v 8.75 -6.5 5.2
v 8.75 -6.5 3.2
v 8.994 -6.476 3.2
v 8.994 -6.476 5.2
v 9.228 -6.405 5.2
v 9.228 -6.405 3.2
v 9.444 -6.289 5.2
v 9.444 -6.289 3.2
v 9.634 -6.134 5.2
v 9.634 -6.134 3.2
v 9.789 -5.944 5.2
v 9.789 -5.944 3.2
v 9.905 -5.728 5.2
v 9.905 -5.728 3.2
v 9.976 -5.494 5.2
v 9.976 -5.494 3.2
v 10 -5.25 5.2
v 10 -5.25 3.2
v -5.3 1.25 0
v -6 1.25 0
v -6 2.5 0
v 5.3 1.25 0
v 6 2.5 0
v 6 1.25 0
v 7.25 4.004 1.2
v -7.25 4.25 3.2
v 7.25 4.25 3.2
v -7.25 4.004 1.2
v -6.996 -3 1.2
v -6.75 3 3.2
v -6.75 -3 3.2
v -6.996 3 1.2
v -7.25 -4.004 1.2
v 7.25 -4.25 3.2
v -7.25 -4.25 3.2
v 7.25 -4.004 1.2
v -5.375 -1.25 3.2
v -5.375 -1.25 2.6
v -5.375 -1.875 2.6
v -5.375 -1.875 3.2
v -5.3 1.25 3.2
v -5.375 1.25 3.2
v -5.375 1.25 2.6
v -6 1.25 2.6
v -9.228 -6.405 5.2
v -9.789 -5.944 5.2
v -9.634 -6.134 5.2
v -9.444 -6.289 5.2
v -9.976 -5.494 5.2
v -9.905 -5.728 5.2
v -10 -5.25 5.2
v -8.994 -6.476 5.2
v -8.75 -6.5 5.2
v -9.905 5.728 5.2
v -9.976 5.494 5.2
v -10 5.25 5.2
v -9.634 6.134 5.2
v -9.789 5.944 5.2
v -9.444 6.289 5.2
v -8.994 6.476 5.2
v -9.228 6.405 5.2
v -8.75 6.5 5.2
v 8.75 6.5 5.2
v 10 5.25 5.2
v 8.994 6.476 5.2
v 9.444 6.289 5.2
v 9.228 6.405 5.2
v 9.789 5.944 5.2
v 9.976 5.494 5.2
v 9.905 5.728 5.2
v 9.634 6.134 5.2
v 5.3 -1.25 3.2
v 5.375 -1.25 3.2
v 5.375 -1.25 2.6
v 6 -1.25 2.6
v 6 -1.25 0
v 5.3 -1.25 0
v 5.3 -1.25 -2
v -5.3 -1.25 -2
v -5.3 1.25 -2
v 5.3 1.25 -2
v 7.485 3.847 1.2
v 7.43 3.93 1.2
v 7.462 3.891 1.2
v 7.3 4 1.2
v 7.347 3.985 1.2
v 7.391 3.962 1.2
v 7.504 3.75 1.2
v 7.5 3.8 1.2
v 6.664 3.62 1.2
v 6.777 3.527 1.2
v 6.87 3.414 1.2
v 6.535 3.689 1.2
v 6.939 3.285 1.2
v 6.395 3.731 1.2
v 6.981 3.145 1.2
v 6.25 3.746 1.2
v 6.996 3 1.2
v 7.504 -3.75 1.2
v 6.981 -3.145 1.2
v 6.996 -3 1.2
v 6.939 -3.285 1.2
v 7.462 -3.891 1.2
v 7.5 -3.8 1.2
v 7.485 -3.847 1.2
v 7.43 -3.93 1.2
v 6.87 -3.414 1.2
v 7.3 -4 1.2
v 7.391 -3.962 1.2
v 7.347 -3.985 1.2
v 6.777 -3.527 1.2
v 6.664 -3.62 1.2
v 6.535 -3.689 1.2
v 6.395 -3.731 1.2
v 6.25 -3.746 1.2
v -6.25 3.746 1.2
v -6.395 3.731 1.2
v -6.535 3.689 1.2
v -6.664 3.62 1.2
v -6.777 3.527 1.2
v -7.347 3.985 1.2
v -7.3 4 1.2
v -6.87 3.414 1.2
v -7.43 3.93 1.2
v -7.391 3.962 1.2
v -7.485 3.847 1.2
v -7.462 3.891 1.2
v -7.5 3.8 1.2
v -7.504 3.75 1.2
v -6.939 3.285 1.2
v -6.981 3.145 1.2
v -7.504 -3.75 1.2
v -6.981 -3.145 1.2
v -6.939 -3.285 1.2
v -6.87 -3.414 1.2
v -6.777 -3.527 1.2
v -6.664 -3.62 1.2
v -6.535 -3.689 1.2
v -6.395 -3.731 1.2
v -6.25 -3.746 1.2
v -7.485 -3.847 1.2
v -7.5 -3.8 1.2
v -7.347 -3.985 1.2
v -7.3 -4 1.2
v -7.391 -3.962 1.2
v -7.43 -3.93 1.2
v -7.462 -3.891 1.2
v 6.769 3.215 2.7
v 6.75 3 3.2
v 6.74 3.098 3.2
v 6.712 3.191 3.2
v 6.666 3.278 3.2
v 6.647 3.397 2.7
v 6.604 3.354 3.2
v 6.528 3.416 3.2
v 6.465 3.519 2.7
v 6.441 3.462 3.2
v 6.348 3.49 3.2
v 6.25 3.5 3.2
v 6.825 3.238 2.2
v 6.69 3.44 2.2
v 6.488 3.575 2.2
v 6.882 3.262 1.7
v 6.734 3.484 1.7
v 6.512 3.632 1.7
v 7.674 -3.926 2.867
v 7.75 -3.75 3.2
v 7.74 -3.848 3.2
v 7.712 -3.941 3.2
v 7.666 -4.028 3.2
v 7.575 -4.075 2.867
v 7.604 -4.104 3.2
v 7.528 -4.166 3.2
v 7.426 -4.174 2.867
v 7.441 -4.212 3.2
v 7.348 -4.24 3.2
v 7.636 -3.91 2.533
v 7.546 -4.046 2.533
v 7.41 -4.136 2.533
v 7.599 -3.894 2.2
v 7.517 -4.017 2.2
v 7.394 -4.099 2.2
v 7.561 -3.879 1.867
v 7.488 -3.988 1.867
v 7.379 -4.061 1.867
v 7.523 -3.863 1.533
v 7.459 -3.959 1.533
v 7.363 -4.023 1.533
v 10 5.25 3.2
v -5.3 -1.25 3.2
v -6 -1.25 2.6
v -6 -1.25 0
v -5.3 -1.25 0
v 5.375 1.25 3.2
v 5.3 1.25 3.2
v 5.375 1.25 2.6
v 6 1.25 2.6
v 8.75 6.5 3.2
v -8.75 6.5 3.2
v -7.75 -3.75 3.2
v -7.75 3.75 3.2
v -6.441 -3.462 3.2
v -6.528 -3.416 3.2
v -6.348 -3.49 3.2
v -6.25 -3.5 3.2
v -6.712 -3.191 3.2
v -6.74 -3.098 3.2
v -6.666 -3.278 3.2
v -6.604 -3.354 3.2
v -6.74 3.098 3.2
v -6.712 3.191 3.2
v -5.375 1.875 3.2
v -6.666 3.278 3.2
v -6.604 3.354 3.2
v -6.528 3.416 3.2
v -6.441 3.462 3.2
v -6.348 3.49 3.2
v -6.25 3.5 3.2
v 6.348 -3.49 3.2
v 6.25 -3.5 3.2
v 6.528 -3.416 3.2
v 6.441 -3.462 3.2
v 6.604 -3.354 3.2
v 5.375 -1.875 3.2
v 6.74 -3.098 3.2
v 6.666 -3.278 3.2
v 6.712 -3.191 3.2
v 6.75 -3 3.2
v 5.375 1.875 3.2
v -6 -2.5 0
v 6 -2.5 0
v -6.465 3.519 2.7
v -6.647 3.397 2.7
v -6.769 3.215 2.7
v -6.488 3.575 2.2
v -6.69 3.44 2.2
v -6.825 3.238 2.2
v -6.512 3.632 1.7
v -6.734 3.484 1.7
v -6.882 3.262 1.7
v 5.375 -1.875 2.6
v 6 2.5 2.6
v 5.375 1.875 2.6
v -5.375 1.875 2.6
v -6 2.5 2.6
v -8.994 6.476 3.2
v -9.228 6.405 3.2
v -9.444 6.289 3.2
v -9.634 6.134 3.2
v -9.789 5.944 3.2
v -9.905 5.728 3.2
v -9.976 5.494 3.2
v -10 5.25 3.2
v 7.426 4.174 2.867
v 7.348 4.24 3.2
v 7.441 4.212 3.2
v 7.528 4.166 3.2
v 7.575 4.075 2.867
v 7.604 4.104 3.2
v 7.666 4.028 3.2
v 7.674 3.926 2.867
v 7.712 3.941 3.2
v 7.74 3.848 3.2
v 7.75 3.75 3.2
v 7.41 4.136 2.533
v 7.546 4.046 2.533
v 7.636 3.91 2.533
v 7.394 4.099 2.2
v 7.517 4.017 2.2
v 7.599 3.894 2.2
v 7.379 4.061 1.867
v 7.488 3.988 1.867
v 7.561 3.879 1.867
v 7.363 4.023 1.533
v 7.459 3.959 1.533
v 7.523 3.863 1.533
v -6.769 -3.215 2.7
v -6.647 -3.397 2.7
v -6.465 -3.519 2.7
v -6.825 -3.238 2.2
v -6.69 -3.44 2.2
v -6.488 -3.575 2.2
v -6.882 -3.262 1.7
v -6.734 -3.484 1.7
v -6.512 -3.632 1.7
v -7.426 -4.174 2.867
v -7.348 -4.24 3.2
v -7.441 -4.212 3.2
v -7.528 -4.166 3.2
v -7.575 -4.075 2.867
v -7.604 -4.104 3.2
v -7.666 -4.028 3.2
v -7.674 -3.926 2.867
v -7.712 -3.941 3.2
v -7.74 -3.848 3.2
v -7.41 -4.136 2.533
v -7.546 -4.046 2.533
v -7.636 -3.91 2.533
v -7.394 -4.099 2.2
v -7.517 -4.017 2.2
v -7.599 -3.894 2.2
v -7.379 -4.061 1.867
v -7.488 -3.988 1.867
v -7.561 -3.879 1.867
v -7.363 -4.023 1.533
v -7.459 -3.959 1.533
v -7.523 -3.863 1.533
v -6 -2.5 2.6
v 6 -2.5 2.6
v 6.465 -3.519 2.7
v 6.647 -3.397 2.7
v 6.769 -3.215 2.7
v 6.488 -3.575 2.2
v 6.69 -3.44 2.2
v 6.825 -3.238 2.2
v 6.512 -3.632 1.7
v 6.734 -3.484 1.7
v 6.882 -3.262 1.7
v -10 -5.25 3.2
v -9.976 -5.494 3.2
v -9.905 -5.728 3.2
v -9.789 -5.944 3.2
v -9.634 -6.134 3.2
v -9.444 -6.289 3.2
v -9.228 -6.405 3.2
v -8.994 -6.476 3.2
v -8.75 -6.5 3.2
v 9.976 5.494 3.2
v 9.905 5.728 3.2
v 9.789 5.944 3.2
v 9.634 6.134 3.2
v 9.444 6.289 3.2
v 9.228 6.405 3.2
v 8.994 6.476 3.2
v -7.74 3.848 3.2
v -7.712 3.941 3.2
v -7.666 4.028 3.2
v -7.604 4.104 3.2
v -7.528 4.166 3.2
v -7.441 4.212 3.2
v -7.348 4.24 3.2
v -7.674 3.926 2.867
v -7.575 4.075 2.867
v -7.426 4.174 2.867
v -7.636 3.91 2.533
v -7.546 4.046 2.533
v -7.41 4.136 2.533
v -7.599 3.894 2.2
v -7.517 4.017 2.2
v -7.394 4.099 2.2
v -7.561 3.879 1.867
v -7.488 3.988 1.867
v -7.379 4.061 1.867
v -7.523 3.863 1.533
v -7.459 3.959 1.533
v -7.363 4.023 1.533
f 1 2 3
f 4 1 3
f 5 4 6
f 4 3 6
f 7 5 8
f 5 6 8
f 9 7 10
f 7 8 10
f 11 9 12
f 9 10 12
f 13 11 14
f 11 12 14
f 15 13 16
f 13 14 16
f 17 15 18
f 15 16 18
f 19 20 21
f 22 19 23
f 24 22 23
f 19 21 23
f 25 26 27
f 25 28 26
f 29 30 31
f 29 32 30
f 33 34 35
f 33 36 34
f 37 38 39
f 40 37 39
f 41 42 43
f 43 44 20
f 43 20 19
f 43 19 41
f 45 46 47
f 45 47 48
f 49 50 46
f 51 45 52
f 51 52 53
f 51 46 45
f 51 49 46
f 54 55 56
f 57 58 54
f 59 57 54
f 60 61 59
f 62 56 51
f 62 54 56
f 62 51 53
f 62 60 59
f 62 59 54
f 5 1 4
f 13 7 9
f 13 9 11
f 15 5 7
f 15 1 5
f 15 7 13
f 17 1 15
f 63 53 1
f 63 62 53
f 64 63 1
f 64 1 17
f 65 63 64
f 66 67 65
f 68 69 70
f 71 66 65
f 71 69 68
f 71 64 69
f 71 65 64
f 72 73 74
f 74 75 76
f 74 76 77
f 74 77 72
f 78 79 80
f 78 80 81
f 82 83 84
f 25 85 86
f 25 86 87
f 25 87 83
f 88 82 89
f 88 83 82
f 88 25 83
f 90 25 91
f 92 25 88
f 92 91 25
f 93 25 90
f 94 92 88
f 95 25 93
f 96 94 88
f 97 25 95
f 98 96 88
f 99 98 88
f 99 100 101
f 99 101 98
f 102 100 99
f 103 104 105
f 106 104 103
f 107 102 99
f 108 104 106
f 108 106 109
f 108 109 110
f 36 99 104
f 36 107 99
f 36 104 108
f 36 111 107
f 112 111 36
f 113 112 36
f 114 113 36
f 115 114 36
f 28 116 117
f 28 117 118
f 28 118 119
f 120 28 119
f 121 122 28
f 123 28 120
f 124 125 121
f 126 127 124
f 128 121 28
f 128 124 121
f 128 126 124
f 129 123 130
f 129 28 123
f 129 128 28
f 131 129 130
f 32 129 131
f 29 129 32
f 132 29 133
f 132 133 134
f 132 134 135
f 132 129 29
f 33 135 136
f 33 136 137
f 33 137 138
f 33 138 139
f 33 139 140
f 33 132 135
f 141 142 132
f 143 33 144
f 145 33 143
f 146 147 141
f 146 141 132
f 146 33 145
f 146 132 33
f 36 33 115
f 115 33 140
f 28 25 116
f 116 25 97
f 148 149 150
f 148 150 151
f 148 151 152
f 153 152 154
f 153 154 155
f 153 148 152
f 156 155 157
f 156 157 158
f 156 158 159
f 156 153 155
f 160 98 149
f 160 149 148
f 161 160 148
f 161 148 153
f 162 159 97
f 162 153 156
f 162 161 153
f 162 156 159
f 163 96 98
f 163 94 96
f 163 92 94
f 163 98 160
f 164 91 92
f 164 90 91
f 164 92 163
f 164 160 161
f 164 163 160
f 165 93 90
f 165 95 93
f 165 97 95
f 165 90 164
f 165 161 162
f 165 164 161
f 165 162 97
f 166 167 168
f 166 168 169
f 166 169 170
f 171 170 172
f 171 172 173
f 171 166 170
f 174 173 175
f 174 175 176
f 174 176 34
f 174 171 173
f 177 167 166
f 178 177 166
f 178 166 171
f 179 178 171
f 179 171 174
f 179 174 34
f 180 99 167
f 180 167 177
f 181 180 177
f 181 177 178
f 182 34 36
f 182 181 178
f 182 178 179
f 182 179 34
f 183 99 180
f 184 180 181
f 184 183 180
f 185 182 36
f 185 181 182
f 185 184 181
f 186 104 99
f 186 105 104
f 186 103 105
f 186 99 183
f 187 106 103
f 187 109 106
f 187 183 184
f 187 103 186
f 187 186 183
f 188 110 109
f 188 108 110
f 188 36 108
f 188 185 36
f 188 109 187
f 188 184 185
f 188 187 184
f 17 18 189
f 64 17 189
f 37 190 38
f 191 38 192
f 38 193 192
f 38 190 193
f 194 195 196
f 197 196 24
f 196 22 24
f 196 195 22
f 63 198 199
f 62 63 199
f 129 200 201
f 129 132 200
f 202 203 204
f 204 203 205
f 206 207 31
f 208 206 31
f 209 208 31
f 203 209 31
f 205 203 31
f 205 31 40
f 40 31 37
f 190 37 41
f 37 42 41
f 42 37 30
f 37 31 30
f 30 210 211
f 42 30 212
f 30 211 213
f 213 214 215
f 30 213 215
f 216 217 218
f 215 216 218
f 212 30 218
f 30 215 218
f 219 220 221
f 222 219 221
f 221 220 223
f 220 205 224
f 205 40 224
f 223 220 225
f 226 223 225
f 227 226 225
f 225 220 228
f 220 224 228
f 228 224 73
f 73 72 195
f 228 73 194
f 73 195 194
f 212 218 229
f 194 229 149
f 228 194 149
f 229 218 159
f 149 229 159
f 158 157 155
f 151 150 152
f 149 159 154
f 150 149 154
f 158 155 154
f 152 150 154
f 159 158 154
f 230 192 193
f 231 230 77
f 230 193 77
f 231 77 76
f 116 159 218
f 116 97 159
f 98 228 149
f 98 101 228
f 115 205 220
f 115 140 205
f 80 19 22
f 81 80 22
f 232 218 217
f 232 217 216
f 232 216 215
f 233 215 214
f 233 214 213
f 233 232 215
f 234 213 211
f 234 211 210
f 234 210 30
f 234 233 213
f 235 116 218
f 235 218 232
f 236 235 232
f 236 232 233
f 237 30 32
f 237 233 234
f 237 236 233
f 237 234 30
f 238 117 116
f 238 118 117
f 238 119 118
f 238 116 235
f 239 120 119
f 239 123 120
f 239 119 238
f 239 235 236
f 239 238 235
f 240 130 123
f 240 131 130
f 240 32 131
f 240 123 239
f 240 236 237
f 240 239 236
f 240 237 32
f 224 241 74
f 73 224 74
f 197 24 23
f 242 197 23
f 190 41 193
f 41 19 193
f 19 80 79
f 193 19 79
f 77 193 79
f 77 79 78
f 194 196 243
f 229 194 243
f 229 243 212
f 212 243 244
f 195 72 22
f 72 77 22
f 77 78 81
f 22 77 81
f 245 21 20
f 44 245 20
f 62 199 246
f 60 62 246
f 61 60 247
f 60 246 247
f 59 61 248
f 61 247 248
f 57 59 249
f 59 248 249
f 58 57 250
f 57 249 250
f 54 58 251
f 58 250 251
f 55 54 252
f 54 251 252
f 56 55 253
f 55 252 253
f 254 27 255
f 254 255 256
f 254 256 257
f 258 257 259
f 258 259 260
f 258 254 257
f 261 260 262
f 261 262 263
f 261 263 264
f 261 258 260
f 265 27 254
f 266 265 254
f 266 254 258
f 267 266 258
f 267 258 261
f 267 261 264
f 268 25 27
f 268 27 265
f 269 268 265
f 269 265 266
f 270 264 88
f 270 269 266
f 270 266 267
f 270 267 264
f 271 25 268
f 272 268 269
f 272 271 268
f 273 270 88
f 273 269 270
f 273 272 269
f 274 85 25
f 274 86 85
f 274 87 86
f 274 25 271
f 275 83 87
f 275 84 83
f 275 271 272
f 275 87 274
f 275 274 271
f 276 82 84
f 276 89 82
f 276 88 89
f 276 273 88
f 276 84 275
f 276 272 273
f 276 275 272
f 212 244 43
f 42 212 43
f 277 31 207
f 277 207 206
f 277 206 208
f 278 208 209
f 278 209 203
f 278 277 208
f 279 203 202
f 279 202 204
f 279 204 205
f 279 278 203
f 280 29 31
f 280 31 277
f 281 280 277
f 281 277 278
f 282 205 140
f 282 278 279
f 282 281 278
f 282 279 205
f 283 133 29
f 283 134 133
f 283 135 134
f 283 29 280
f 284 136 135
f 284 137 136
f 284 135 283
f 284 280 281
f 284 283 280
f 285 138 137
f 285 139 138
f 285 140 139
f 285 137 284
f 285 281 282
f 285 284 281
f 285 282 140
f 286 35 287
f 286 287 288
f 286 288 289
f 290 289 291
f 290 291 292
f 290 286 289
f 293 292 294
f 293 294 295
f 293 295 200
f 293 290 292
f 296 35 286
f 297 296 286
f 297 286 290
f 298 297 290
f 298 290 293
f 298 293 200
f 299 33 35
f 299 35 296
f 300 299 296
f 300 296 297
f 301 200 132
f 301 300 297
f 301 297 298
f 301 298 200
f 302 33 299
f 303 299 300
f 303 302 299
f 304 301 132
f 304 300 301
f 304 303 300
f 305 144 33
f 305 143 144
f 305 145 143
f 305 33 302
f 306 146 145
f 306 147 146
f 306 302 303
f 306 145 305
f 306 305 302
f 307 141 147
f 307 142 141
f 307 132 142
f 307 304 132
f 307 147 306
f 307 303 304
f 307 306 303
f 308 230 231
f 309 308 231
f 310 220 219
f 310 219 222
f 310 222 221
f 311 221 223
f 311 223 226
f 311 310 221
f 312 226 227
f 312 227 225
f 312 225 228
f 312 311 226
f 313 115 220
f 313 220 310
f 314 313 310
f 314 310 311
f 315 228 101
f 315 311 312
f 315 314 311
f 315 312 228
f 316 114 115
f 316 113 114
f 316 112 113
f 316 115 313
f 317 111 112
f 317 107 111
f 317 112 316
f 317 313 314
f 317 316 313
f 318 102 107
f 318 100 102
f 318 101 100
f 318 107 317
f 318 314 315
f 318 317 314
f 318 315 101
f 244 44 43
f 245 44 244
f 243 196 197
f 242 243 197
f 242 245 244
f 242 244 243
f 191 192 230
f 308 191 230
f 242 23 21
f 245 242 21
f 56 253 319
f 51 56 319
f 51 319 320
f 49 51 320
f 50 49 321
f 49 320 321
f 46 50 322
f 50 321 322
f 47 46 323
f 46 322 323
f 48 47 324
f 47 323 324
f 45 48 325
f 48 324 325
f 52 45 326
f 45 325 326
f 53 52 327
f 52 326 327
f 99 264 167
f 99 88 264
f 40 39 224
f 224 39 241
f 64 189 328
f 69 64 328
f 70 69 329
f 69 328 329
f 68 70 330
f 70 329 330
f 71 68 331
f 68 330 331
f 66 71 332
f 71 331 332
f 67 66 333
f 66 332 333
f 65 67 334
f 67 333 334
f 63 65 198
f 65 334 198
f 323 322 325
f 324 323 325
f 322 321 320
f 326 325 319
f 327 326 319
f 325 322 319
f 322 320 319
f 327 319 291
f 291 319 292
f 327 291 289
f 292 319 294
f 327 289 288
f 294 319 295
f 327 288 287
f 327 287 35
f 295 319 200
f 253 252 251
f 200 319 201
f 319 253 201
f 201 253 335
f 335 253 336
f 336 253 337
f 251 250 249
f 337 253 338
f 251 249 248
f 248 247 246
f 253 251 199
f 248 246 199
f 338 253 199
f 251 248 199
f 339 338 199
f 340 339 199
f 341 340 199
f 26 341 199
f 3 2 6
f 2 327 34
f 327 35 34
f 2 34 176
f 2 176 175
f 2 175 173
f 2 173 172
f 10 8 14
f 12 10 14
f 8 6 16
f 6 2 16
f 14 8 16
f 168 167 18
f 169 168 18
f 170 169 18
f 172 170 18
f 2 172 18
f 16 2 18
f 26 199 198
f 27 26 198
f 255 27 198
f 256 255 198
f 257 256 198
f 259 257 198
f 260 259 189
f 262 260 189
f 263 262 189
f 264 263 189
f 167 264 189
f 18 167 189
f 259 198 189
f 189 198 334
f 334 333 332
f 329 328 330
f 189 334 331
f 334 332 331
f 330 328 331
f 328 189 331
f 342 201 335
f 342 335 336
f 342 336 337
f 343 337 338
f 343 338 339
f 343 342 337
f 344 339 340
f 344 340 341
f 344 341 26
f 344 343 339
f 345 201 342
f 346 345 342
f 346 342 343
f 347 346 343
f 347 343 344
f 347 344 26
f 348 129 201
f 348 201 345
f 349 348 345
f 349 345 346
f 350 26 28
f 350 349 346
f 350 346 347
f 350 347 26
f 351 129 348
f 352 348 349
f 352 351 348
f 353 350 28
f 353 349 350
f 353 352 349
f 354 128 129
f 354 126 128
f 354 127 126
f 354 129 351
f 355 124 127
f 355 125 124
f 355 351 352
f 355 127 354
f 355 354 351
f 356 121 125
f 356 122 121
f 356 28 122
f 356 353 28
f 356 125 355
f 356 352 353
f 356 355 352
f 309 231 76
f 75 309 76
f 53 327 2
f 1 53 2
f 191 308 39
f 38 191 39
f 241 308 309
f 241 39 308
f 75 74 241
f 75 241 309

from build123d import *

# Parameters (mm, degrees)
F1_DEPTH = 2.6
F2_W     = 10.6
F2_H     = 2.5
F3_DEPTH = 2
F5_DEPTH = 0.6
F7_DEPTH = 2
F9_DEPTH = 2
F9_TAPER = 7


# Not quite as in the source:
# - a feature names something its author has since deleted; it is built from what else it names


with BuildPart() as f1:
    # F0 (on Top) → F1 (new body)
    with BuildSketch(Plane.XY):
        Polygon((6, 2.5), (-6, 2.5), (-6, 1.25), (-5.3, 1.25), (-5.3, -1.25), (-6, -1.25), (-6, -2.5), (6, -2.5), (6, -1.25), (5.3, -1.25), (5.3, 1.25), (6, 1.25), align=None)
    extrude(amount=F1_DEPTH)

    # F2 (on face) → F3 (join)
    with BuildSketch(Plane(origin=(0, 0, 0), x_dir=(1, 0, 0), z_dir=(0, 0, -1))):
        Rectangle(F2_W, F2_H)
    extrude(amount=F3_DEPTH)

    # F4 (on face) → F5 (join)
    with BuildSketch(Plane.XY.offset(2.6)):
        Polygon((5.375, 1.875), (-5.375, 1.875), (-5.375, 1.25), (-5.3, 1.25), (-5.3, -1.25), (-5.375, -1.25), (-5.375, -1.875), (5.375, -1.875), (5.375, -1.25), (5.3, -1.25), (5.3, 1.25), (5.375, 1.25), align=None)
    extrude(amount=F5_DEPTH)

    # F6 (on face) → F7 (join)
    with BuildSketch(Plane.XY.offset(3.2)):
        with BuildLine():
            Line((8.75, 6.5), (-8.75, 6.5))
            ThreePointArc((-8.75, 6.5), (-9.6338834765, 6.1338834765), (-10, 5.25))
            Line((-10, 5.25), (-10, -5.25))
            ThreePointArc((-10, -5.25), (-9.6338834765, -6.1338834765), (-8.75, -6.5))
            Line((-8.75, -6.5), (8.75, -6.5))
            ThreePointArc((8.75, -6.5), (9.6338834765, -6.1338834765), (10, -5.25))
            Line((10, -5.25), (10, 5.25))
            ThreePointArc((10, 5.25), (9.6338834765, 6.1338834765), (8.75, 6.5))
        make_face()
    extrude(amount=F7_DEPTH)

    # F8 (on face) → F9 (join)
    with BuildSketch(Plane(origin=(0, 0, 3.2), x_dir=(1, 0, 0), z_dir=(0, 0, -1))):
        with BuildLine():
            Line((7.25, 4.25), (-7.25, 4.25))
            ThreePointArc((-7.25, 4.25), (-7.6035533906, 4.1035533906), (-7.75, 3.75))
            Line((-7.75, 3.75), (-7.75, -3.75))
            ThreePointArc((-7.75, -3.75), (-7.6035533906, -4.1035533906), (-7.25, -4.25))
            Line((-7.25, -4.25), (7.25, -4.25))
            ThreePointArc((7.25, -4.25), (7.6035533906, -4.1035533906), (7.75, -3.75))
            Line((7.75, -3.75), (7.75, 3.75))
            ThreePointArc((7.75, 3.75), (7.6035533906, 4.1035533906), (7.25, 4.25))
        make_face()
        with BuildLine():
            ThreePointArc((-6.75, 3), (-6.6035533906, 3.3535533906), (-6.25, 3.5))
            Line((-6.25, 3.5), (6.25, 3.5))
            ThreePointArc((6.25, 3.5), (6.6035533906, 3.3535533906), (6.75, 3))
            Line((6.75, 3), (6.75, -3))
            ThreePointArc((6.75, -3), (6.6035533906, -3.3535533906), (6.25, -3.5))
            Line((6.25, -3.5), (-6.25, -3.5))
            ThreePointArc((-6.25, -3.5), (-6.6035533906, -3.3535533906), (-6.75, -3))
            Line((-6.75, -3), (-6.75, 3))
        make_face(mode=Mode.SUBTRACT)
    extrude(amount=F9_DEPTH, taper=F9_TAPER)


solid = f1.part
